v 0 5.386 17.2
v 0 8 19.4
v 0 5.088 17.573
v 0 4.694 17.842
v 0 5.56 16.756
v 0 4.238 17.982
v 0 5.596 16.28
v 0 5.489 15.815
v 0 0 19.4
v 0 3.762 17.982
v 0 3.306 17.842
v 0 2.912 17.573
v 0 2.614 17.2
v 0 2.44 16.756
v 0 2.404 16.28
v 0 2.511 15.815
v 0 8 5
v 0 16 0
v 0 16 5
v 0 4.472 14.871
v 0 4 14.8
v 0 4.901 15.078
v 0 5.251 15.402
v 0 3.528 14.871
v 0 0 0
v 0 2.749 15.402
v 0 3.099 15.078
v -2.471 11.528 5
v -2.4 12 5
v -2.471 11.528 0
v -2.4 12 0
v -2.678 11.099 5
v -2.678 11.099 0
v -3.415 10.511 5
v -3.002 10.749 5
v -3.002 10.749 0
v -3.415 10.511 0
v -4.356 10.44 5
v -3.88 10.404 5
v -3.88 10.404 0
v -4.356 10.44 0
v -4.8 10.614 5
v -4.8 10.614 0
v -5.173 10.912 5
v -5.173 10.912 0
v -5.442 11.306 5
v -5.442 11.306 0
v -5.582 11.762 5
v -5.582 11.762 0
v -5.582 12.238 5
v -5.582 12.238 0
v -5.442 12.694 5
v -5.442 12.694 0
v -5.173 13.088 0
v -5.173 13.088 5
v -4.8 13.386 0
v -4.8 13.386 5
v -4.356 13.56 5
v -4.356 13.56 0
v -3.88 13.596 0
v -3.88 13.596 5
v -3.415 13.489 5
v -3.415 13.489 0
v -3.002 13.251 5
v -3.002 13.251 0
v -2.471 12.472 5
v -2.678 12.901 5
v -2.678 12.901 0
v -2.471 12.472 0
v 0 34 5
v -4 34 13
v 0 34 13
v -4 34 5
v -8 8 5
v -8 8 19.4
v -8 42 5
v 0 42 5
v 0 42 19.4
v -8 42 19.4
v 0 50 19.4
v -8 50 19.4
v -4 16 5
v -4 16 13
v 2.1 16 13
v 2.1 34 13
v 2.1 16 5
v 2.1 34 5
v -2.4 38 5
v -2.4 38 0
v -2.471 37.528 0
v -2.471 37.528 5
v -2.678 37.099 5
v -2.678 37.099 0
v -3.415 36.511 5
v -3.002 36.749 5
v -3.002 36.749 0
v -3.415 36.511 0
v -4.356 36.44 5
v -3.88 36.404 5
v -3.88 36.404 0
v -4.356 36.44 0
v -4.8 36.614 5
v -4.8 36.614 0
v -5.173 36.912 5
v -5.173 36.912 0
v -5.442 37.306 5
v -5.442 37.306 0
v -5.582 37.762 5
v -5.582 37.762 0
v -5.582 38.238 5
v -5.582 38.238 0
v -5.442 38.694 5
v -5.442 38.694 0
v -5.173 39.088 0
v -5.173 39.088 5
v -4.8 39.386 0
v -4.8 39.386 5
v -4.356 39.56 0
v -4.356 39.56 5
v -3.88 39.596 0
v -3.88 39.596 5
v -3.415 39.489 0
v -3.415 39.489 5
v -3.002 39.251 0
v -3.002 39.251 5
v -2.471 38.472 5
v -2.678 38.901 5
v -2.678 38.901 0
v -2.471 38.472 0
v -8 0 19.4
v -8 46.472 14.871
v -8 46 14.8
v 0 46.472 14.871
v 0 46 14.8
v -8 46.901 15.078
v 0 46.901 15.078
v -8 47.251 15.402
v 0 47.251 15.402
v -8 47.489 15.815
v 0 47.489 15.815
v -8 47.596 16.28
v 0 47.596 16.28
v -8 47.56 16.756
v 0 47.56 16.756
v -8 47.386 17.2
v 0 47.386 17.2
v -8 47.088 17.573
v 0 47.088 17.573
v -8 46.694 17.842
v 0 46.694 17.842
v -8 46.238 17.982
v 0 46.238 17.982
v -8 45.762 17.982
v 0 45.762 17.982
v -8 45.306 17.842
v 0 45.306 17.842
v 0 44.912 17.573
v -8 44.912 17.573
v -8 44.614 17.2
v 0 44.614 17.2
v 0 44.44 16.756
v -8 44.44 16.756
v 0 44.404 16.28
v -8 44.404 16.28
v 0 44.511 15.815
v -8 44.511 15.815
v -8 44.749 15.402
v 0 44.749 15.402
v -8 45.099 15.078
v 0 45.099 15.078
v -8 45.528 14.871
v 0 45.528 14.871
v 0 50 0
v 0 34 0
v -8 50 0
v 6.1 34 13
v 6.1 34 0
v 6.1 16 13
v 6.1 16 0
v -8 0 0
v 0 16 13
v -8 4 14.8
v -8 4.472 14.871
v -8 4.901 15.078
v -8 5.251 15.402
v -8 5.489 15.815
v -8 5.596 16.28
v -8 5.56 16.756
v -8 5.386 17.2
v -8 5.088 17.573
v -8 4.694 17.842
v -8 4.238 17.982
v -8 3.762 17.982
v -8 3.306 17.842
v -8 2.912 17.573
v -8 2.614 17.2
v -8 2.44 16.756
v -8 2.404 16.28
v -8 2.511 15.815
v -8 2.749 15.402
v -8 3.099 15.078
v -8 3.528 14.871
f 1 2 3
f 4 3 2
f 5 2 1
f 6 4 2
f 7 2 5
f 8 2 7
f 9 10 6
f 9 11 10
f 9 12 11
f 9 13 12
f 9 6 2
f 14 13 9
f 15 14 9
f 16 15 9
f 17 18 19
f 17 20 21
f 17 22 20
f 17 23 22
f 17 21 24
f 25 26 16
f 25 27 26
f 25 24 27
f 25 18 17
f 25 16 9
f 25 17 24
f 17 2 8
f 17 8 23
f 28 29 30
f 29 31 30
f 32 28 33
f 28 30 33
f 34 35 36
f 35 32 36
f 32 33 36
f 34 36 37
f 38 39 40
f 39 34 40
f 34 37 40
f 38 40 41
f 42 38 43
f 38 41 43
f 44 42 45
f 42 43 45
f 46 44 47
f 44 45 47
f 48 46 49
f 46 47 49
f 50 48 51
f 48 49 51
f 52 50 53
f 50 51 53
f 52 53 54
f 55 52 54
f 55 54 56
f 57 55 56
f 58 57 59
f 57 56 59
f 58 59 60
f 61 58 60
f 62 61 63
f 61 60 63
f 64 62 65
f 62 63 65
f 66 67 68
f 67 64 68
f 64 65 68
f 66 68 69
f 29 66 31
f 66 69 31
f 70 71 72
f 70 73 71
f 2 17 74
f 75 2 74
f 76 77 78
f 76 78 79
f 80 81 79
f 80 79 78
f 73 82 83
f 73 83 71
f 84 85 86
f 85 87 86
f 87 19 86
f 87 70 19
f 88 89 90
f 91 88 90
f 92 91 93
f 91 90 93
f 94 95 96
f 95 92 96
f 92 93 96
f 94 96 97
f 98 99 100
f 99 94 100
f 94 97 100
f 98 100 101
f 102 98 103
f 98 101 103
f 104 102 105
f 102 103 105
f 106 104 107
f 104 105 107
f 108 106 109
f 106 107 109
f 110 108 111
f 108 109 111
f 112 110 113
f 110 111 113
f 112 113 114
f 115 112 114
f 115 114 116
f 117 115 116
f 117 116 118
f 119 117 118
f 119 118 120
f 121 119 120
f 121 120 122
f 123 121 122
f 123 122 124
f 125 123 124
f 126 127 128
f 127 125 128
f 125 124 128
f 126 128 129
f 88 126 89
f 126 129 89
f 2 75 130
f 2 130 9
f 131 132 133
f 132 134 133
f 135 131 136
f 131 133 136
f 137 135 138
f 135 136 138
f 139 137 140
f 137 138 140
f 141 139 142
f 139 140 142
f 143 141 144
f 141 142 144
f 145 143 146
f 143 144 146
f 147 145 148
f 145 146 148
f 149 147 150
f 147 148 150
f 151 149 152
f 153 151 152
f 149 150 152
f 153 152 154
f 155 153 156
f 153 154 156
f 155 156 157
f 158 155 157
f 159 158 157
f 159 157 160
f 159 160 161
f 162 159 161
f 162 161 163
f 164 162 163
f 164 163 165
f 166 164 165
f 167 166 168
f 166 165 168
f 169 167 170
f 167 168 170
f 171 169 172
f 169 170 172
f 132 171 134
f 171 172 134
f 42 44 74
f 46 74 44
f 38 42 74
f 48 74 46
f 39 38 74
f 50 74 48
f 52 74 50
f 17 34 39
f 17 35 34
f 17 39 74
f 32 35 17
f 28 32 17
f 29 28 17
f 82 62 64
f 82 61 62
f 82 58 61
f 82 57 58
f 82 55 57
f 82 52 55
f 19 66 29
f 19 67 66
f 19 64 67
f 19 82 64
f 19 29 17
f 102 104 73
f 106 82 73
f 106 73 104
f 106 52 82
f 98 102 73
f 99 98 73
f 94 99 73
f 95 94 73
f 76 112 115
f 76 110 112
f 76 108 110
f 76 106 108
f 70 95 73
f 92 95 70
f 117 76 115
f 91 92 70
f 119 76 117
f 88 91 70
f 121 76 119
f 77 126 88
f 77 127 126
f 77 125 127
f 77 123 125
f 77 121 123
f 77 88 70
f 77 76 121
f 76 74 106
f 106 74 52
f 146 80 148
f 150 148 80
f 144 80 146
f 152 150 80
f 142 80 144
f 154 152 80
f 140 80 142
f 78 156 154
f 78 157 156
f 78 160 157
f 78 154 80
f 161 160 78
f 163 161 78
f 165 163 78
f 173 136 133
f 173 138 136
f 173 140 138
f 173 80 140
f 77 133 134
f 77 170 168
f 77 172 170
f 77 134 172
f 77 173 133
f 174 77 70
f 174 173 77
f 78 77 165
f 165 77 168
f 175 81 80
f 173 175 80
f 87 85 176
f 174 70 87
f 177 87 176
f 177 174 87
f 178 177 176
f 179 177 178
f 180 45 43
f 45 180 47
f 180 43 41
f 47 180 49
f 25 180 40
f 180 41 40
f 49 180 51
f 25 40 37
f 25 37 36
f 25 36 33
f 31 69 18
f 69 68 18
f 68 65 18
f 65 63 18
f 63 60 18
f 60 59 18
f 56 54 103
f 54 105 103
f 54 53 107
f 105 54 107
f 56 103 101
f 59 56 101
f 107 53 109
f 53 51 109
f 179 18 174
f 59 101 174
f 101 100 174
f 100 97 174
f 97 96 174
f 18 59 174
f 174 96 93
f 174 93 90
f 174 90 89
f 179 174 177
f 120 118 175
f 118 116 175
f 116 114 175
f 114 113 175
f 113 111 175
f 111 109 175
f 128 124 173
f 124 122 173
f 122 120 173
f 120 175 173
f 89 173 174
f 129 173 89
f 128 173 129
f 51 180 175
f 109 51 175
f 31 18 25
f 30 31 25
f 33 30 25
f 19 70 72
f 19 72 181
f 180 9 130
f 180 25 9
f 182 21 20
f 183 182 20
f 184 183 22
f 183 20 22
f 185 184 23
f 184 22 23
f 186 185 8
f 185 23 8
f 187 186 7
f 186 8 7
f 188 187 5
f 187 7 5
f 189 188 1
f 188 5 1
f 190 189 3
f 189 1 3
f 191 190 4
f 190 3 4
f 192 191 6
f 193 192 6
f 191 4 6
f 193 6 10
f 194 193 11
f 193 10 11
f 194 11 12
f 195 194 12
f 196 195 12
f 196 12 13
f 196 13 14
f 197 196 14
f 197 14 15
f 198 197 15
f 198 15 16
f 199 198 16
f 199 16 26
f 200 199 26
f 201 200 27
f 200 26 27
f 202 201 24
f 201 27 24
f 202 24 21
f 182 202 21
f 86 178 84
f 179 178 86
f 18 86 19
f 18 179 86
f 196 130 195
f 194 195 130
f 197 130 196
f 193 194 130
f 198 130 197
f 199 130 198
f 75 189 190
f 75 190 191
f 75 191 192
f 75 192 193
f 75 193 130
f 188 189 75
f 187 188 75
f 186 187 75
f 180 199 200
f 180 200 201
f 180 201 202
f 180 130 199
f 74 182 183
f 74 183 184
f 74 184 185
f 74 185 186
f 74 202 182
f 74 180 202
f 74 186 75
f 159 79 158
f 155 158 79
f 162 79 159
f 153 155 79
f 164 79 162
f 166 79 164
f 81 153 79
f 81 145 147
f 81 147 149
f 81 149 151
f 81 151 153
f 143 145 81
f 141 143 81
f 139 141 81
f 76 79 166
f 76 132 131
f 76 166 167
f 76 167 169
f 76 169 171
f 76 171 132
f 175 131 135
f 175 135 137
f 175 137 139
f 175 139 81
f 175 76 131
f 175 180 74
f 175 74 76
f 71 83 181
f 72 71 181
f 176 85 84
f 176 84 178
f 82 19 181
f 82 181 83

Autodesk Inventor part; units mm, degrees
ref_plane "YZ Plane" through (0, 0, 0) normal (1, 0, 0) x (0, 1, 0)
ref_plane "XZ Plane" through (0, 0, 0) normal (0, 1, 0) x (-1, 0, 0)
ref_plane "XY Plane" through (0, 0, 0) normal (0, 0, 1) x (1, 0, 0)
sketch "Sketch1" plane through (0, 0, 0) normal (0, 0, 1) x (1, 0, 0)
  line L0 (0, 0) -> (-8, 0)
  line L1 (-8, 0) -> (-8, 50)
  line L2 (-8, 50) -> (0, 50)
  line L3 (0, 50) -> (0, 0)
  circle A0 centre (-4, 38) radius 1.6
  circle A1 centre (-4, 12) radius 1.6
  line L4 (0, 34) -> (6.1, 34)
  line L5 (6.1, 34) -> (6.1, 16)
  line L6 (6.1, 16) -> (0, 16)
  line L7 (0, 16) -> (0, 34)
  point P0 (-4, 50)
  point P1 (-4, 0)
  point P2 (0, 25)
  dimension "d0" = 8
  dimension "d1" = 50
  dimension "d2" = 3.2
  dimension "d3" = 3.2
  dimension "d18" = 6.1
  dimension "d19" = 18
  dimension "d28" = 4
  dimension "d29" = 4
extrude "Extrusion1" add sketch "Sketch1" along normal blind 5
sketch "Sketch2" plane through (0, 0, 5) normal (0, 0, 1) x (1, 0, 0)
  line L0 (-8, 0) -> (0, 0) projected
  line L1 (0, 50) -> (-8, 50) projected
  line L2 (-8, 50) -> (0, 50)
  line L3 (0, 50) -> (0, 42)
  line L4 (0, 42) -> (-8, 42)
  line L5 (-8, 42) -> (-8, 50)
  line L6 (-8, 0) -> (0, 0)
  line L7 (0, 0) -> (0, 8)
  line L8 (0, 8) -> (-8, 8)
  line L9 (-8, 8) -> (-8, 0)
  dimension "d8" = 8
  dimension "d10" = 8
extrude "Extrusion2" add sketch "Sketch2" along normal blind 14.4
sketch "Sketch3" plane through (0, 0, 0) normal (1, 0, 0) x (0, 0, -1)
  circle A0 centre (-16.4, 46) radius 1.6
  circle A1 centre (-16.4, 4) radius 1.6
  line L0 (-19.4, 42) -> (-19.4, 50) projected
  line L1 (-19.4, 0) -> (-19.4, 8) projected
  point P0 (0, 0)
  point P1 (-19.4, 46)
  point P2 (-19.4, 4)
  dimension "d13" = 3.2
  dimension "d14" = 3.2
  dimension "d15" = 3
extrude "Extrusion3" cut sketch "Sketch3" against normal blind 15
sketch "Sketch4" plane through (0, 0, 5) normal (0, 0, 1) x (1, 0, 0)
  line L0 (6.1, 16) -> (6.1, 34) projected
  line L1 (6.1, 34) -> (2.1, 34)
  line L2 (2.1, 34) -> (2.1, 16)
  line L3 (2.1, 16) -> (6.1, 16)
  line L4 (6.1, 16) -> (6.1, 34)
  line L5 (0, 16) -> (6.1, 16) projected
  line L6 (6.1, 34) -> (0, 34) construction
  line L7 (-4, 34) -> (0, 34)
  line L8 (0, 34) -> (0, 16)
  line L9 (0, 16) -> (-4, 16)
  line L10 (-4, 16) -> (-4, 34)
  point P0 (0, 0)
  dimension "d21" = 4
  dimension "d26" = 4
  dimension "d27" = 2.1
extrude "Extrusion4" add sketch "Sketch4" along normal blind 8
equation "\"d29\" = d28"
equation "\"d8\" = d10"
properties part number "X rollers"
